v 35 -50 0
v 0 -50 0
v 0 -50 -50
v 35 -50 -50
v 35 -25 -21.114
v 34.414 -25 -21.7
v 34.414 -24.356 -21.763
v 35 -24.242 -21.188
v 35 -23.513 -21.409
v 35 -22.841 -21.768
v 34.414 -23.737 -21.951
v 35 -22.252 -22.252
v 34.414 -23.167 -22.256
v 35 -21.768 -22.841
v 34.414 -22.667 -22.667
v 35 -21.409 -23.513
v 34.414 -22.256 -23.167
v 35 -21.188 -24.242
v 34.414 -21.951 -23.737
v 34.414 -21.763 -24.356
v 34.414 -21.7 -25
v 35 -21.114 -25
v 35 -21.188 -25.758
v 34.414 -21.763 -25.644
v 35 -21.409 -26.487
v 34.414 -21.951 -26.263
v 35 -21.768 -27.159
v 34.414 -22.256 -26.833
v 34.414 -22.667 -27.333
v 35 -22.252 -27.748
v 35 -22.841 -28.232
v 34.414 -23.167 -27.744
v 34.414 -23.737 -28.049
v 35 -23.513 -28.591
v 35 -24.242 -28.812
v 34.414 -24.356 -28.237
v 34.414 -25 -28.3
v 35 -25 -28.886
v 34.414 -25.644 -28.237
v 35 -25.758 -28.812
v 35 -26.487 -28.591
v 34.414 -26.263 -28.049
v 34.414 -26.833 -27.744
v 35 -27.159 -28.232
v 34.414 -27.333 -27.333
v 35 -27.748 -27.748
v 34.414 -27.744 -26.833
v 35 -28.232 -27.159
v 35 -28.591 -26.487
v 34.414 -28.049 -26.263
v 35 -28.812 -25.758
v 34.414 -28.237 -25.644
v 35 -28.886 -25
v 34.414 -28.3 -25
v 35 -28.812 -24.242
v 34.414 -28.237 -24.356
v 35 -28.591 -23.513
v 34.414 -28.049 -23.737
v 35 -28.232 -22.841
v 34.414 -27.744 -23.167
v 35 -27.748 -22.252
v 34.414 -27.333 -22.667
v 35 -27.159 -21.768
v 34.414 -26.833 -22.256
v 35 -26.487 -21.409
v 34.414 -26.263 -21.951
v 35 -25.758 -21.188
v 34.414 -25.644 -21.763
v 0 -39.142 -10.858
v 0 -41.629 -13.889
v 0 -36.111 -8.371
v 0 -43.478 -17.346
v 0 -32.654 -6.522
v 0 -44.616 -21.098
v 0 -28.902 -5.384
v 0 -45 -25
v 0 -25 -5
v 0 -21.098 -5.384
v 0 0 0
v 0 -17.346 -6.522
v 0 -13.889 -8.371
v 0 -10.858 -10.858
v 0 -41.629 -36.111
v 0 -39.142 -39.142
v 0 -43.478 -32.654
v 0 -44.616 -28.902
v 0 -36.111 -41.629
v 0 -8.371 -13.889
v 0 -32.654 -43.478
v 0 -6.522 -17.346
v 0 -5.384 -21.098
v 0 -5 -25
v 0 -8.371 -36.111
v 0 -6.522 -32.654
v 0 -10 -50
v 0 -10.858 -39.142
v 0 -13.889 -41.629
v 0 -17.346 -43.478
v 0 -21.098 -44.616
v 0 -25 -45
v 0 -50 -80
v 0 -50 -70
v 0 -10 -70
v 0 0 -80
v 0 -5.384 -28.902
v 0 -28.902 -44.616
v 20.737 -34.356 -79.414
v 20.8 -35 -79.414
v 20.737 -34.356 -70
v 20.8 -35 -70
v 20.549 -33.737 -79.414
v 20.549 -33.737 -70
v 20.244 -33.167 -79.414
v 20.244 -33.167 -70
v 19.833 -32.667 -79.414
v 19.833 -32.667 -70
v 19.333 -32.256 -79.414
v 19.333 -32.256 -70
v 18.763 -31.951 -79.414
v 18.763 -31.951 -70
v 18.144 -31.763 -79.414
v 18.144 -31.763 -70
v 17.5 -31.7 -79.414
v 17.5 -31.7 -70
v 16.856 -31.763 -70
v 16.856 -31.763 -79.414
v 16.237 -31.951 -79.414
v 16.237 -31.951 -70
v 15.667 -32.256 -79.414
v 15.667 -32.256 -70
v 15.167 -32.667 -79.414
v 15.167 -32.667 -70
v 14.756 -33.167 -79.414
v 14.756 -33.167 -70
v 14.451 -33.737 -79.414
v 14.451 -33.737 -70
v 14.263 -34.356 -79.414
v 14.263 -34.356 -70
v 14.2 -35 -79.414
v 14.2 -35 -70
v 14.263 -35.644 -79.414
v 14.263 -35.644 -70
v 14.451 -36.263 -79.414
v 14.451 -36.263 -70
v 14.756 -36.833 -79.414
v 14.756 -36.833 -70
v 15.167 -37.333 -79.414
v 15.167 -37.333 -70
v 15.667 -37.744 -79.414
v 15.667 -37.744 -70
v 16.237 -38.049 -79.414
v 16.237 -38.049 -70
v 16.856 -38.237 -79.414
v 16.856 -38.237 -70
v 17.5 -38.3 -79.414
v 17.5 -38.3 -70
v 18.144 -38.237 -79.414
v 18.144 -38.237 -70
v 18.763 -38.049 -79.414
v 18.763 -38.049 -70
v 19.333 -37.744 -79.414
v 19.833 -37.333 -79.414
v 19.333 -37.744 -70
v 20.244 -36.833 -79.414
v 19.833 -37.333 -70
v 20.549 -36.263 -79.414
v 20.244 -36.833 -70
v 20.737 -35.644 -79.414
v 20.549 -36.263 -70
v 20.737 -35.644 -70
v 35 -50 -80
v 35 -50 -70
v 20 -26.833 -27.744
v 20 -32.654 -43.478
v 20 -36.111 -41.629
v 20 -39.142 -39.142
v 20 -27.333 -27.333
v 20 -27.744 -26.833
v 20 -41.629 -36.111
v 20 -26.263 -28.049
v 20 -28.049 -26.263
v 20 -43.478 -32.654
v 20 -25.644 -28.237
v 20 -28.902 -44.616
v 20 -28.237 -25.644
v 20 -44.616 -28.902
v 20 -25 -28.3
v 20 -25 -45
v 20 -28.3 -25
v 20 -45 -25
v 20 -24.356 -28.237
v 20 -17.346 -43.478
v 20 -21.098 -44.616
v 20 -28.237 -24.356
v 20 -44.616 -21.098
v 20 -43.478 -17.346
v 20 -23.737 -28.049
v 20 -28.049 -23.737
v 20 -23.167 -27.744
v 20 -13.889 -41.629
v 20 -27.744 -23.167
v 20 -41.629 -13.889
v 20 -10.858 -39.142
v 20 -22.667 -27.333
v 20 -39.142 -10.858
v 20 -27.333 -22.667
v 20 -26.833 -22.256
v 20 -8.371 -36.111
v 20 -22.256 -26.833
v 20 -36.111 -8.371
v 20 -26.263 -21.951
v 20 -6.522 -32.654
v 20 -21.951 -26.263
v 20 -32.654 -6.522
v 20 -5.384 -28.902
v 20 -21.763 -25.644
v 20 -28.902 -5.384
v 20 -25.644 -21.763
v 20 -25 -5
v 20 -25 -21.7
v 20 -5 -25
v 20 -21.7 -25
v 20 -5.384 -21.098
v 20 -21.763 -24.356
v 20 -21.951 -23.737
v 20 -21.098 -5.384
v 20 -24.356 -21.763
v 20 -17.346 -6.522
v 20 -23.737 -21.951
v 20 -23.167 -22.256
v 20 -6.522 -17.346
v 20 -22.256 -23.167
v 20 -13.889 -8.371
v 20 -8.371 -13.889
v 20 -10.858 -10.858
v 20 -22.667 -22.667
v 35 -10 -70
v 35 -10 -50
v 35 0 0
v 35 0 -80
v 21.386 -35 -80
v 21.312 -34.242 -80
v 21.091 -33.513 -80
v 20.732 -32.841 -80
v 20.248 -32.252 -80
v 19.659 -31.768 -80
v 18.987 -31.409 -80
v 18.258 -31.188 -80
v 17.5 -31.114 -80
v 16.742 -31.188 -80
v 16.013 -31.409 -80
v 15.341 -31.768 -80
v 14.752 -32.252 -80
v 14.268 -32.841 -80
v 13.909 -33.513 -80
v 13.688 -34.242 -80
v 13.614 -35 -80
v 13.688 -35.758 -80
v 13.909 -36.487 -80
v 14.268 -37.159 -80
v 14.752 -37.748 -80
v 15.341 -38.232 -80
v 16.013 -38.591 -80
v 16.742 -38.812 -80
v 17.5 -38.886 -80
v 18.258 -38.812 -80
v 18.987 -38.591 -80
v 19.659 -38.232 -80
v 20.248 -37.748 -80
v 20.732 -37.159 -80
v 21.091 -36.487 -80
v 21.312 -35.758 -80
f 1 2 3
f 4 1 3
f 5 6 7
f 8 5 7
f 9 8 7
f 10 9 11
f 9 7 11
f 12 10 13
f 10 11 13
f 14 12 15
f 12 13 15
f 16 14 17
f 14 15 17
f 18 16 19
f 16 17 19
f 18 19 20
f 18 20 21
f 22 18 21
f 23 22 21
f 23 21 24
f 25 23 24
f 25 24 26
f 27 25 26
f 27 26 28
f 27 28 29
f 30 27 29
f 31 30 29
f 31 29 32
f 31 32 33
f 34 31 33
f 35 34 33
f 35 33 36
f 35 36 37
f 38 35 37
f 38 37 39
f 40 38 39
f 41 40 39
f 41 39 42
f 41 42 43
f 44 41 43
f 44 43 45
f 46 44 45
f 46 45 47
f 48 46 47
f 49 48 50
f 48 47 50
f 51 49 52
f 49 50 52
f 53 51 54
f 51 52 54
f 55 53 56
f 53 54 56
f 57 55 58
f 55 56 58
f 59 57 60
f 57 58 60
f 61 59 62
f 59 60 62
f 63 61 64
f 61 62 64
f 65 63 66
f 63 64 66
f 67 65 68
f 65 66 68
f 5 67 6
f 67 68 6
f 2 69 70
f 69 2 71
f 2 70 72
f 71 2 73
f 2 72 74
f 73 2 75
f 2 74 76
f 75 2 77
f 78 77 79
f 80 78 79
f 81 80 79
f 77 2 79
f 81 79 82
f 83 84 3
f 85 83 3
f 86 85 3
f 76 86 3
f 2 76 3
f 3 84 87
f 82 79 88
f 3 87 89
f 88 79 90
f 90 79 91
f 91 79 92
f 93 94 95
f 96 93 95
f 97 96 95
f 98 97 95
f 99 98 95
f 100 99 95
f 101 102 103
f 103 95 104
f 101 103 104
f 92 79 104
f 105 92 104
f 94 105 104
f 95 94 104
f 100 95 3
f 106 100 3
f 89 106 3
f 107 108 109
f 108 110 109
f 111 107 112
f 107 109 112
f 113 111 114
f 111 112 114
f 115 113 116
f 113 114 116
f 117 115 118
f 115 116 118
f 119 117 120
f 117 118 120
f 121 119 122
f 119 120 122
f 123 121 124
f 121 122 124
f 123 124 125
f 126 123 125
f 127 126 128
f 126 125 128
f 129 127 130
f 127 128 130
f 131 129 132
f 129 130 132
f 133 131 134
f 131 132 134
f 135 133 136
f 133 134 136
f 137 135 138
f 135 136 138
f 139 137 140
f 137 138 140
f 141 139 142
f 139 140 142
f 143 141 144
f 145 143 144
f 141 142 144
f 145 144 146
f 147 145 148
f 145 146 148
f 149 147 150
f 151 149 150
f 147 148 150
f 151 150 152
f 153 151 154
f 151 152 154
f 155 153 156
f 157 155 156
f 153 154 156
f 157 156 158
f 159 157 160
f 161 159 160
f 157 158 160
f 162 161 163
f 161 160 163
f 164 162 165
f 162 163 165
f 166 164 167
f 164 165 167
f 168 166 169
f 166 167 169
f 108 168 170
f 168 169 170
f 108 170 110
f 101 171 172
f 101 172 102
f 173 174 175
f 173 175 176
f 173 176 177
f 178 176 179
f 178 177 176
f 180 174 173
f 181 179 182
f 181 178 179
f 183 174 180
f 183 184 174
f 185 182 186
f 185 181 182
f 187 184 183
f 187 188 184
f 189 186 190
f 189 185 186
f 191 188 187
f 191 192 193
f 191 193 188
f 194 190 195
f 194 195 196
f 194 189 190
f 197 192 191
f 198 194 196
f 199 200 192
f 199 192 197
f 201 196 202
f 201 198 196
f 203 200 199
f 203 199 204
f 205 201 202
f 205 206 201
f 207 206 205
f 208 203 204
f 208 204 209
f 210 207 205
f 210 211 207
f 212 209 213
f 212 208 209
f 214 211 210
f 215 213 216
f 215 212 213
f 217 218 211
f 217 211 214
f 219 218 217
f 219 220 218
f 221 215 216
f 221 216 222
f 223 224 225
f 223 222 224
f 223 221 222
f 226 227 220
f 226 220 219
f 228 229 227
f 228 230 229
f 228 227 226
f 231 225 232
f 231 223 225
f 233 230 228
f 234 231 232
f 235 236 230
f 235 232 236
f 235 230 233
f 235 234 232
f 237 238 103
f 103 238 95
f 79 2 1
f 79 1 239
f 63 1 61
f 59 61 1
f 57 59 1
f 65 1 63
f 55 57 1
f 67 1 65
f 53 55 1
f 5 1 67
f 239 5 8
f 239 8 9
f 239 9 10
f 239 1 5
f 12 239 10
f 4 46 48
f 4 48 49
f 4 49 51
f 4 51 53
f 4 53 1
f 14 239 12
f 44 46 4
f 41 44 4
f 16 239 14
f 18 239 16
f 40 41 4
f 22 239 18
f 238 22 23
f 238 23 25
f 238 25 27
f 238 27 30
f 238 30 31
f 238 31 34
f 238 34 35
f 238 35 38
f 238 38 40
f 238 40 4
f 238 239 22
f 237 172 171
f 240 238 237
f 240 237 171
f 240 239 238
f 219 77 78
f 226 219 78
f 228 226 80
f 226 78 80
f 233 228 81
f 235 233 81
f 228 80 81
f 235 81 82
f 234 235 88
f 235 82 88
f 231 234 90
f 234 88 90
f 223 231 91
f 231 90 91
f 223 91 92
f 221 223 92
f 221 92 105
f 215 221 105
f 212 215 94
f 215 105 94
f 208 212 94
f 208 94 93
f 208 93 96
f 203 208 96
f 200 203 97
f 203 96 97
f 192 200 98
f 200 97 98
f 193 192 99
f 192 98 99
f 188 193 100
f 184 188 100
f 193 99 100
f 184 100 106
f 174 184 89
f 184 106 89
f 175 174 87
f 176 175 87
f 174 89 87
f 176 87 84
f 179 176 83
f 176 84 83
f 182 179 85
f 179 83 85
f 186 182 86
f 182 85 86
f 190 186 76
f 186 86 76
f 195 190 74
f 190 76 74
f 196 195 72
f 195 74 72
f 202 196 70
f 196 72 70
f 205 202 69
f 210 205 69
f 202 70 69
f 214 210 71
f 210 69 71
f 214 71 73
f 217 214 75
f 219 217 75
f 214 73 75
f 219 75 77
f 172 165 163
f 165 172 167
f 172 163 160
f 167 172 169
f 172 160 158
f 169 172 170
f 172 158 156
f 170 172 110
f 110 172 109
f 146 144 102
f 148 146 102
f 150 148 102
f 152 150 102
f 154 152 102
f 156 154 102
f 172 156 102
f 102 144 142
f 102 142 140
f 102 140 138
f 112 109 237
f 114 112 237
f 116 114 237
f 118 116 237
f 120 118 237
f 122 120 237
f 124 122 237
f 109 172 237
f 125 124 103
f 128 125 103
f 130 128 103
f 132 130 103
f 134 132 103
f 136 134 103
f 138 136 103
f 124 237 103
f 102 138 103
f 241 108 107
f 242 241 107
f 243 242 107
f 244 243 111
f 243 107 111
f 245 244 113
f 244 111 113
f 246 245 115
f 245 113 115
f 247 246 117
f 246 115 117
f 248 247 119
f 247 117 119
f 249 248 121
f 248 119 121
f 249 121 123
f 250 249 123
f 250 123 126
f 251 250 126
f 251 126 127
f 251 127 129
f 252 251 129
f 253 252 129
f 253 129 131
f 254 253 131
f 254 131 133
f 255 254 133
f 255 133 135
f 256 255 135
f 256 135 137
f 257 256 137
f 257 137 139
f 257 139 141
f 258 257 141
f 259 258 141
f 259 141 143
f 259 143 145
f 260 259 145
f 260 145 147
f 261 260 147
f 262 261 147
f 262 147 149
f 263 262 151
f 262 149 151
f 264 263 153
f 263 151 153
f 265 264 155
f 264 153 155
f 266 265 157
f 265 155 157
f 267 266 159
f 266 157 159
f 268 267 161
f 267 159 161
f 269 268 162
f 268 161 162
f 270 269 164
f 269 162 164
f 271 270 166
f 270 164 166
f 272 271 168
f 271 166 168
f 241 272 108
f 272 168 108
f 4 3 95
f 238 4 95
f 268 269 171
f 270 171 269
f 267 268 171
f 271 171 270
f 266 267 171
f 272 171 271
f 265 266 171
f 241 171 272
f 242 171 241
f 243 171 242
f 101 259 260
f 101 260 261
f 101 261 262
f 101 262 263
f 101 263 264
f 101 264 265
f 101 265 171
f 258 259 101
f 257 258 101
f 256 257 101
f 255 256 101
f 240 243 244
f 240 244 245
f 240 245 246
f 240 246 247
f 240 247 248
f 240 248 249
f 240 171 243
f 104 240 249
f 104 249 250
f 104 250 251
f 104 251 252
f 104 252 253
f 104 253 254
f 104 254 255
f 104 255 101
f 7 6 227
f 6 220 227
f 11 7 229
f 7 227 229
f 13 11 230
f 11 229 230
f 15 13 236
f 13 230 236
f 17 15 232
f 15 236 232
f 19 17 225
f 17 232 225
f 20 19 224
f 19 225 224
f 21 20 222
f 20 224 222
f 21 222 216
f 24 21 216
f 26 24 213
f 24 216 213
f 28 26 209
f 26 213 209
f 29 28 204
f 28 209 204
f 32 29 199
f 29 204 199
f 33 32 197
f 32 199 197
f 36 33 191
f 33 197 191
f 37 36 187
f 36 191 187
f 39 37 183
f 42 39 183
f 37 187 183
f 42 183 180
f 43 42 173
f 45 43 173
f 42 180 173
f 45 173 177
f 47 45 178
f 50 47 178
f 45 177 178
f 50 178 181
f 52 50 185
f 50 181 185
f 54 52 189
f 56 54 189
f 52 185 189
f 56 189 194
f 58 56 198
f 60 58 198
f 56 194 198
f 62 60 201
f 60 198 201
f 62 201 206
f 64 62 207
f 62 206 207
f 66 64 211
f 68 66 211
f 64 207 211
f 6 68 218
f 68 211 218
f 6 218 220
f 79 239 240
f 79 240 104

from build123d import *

# Parameters (mm, degrees)
SKETCH_2_W                      = 50
SKETCH_2_H                      = 50
EXTRUDE_1_DEPTH                 = 35
SKETCH_3_R                      = 20
CUT_EXTRUDE_1_DEPTH             = 20
HOLE_WIZARD_G1_16_1_D           = 6.6
HOLE_WIZARD_G1_16_1_DEPTH       = 20
HOLE_WIZARD_G1_16_1_CSINK_D     = 7.773
HOLE_WIZARD_G1_16_1_CSINK_ANGLE = 90
HOLE_WIZARD_G1_16_1_TIP         = 1.982840043
SKETCH_6_W                      = 35
SKETCH_6_H                      = 10
EXTRUDE_2_DEPTH                 = 30
SKETCH_7_W                      = 35
SKETCH_7_H                      = 10
EXTRUDE_3_DEPTH                 = 40
HOLE_WIZARD_G1_16_2_D           = 6.6
HOLE_WIZARD_G1_16_2_DEPTH       = 20
HOLE_WIZARD_G1_16_2_CSINK_D     = 7.773
HOLE_WIZARD_G1_16_2_CSINK_ANGLE = 90
HOLE_WIZARD_G1_16_2_TIP         = 1.982840043


with BuildPart() as part:
    # 草图2 → 凸台-拉伸1 (new body)
    with BuildSketch(Plane(origin=(0, 0, 0), x_dir=(0, 0, -1), z_dir=(1, 0, 0))):
        with Locations((25, -25)):
            Rectangle(SKETCH_2_W, SKETCH_2_H)
    extrude(amount=EXTRUDE_1_DEPTH)

    # 草图3 → 切除-拉伸1 (cut)
    with BuildSketch(Plane.ZY):
        with Locations((-25, -25)):
            Circle(SKETCH_3_R)
    extrude(amount=-CUT_EXTRUDE_1_DEPTH, mode=Mode.SUBTRACT)

    # G1/16 螺纹孔1
    with Locations(Plane(origin=(35, 0, 0), x_dir=(0, 0, -1), z_dir=(1, 0, 0))):
        with Locations((25, -25)):
            CounterSinkHole(HOLE_WIZARD_G1_16_1_D / 2, HOLE_WIZARD_G1_16_1_CSINK_D / 2, depth=HOLE_WIZARD_G1_16_1_DEPTH, counter_sink_angle=HOLE_WIZARD_G1_16_1_CSINK_ANGLE)
            with Locations((0, 0, -(HOLE_WIZARD_G1_16_1_DEPTH + HOLE_WIZARD_G1_16_1_TIP / 2))):  # 118° drill point
                Cone(0, HOLE_WIZARD_G1_16_1_D / 2, HOLE_WIZARD_G1_16_1_TIP, mode=Mode.SUBTRACT)

    # 草图6 → 凸台-拉伸2 (add)
    with BuildSketch(Plane(origin=(0, 0, -50), x_dir=(-1, 0, 0), z_dir=(0, 0, -1))):
        with Locations((-17.5, -5)):
            Rectangle(SKETCH_6_W, SKETCH_6_H)
    extrude(amount=EXTRUDE_2_DEPTH)

    # 草图7 → 凸台-拉伸3 (add)
    with BuildSketch(Plane(origin=(0, -10, 0), x_dir=(-1, 0, 0), z_dir=(0, -1, 0))):
        with Locations((-17.5, 75)):
            Rectangle(SKETCH_7_W, SKETCH_7_H)
    extrude(amount=EXTRUDE_3_DEPTH)

    # G1/16 螺纹孔2
    with Locations(Plane(origin=(0, 0, -80), x_dir=(-1, 0, 0), z_dir=(0, 0, -1))):
        with Locations((-17.5, -35)):
            CounterSinkHole(HOLE_WIZARD_G1_16_2_D / 2, HOLE_WIZARD_G1_16_2_CSINK_D / 2, depth=HOLE_WIZARD_G1_16_2_DEPTH, counter_sink_angle=HOLE_WIZARD_G1_16_2_CSINK_ANGLE)
            with Locations((0, 0, -(HOLE_WIZARD_G1_16_2_DEPTH + HOLE_WIZARD_G1_16_2_TIP / 2))):  # 118° drill point
                Cone(0, HOLE_WIZARD_G1_16_2_D / 2, HOLE_WIZARD_G1_16_2_TIP, mode=Mode.SUBTRACT)


solid = part.part
